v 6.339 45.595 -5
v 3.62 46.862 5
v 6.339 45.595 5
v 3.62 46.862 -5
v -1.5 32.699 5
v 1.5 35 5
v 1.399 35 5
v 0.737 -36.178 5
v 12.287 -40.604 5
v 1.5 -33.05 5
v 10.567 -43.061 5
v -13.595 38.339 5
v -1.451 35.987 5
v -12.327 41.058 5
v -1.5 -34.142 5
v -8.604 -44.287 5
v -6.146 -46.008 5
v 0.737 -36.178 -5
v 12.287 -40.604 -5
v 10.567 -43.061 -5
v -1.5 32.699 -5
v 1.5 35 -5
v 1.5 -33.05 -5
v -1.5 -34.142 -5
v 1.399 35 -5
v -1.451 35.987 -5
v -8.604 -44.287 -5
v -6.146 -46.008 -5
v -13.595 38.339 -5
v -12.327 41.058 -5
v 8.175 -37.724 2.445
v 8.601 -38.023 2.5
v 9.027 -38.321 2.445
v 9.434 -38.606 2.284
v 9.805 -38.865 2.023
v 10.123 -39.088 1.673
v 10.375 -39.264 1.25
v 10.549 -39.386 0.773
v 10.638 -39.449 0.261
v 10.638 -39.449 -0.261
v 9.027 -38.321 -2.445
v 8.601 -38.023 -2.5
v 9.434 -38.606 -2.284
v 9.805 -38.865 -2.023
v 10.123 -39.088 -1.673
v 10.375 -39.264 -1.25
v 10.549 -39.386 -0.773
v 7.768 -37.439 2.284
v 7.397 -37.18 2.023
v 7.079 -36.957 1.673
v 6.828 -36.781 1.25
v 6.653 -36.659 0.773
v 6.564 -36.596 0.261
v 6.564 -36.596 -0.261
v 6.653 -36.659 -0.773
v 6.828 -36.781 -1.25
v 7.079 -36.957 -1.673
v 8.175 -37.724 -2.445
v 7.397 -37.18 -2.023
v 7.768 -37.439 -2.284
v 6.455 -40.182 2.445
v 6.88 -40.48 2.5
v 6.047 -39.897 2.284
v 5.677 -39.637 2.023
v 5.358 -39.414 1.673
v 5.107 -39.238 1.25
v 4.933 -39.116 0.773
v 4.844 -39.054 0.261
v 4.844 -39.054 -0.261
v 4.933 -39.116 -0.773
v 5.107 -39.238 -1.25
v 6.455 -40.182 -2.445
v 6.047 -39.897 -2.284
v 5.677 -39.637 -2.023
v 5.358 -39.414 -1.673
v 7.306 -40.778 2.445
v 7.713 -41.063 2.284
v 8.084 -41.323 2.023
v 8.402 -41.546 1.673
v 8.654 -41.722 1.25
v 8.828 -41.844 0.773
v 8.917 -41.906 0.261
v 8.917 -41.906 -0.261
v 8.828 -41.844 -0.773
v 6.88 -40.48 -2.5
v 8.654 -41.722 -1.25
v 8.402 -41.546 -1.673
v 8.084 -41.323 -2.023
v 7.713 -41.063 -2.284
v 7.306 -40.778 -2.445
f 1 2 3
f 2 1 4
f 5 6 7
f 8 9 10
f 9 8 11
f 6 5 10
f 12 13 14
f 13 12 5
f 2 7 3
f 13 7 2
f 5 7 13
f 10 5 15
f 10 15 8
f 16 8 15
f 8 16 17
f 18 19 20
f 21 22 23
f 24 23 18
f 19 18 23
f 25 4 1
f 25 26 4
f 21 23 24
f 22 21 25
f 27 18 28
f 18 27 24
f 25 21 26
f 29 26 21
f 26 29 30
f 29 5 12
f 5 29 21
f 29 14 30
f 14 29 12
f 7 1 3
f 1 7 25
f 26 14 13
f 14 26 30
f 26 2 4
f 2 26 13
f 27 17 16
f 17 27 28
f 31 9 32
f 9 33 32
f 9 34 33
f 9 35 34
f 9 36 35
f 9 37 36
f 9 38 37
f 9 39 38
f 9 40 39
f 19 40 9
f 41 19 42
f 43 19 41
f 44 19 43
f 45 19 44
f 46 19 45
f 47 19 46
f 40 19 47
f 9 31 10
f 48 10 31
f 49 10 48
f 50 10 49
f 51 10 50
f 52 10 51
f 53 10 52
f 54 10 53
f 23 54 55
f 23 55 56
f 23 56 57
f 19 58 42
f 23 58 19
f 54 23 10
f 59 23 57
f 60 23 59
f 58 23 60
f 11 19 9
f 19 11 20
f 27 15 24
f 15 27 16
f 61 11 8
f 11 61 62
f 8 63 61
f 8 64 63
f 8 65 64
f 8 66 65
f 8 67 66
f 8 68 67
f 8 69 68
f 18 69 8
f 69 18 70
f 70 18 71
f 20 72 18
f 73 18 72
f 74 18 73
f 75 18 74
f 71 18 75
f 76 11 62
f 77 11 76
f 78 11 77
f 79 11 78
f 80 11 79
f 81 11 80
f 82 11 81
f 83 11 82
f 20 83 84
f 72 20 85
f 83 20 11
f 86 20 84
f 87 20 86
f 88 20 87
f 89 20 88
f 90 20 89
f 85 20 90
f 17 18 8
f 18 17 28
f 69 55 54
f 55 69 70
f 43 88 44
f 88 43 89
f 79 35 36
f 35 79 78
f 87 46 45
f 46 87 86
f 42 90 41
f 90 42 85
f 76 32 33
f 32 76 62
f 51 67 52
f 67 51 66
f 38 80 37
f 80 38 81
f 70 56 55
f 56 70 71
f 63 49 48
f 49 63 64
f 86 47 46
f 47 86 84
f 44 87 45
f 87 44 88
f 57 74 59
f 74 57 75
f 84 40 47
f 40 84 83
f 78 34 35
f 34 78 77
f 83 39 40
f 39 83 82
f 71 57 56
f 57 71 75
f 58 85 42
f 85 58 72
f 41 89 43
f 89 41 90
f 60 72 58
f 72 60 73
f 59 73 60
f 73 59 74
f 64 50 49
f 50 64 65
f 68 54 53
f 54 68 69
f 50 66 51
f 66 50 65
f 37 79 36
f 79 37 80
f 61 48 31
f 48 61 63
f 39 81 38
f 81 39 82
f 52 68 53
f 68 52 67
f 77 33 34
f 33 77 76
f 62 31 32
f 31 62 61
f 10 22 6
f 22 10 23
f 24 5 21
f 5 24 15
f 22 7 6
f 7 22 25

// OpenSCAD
$fn=30;

end_cube_size=15;
end_cube_height=10;
thickness=3;
fiddle=3;
shaft_length=70;
rounding_radius=2;

module holy_end_cup() {
    difference() {
        end_cup();
        translate([-end_cube_size/2-thickness, end_cube_size*0.7, 0]) {
            rotate([0, 90, 0]) {
               cylinder(r=2.5, h=30);
            }
        }
    }
}

module end_cup() {
    translate([0, 0, -end_cube_height/2]) {
        difference() {
            cube([end_cube_size, end_cube_size, end_cube_height]);

            translate([thickness,thickness, -fiddle]) {
                cube([end_cube_size, end_cube_size, end_cube_height+fiddle*2]);
            }
        }
    }
}

module shaft() {
    cube([thickness, shaft_length, end_cube_height], center=true);
}

module end_cups() {
    translate([0, shaft_length/2-thickness, 0]) {
        rotate([0, 0, 65]) end_cup();
    }
    translate([0, -shaft_length/2+thickness, 0]) {
        rotate([0, 0, 235]) holy_end_cup();
    }
}

module body() {
    end_cups();
    shaft();
}

body();
